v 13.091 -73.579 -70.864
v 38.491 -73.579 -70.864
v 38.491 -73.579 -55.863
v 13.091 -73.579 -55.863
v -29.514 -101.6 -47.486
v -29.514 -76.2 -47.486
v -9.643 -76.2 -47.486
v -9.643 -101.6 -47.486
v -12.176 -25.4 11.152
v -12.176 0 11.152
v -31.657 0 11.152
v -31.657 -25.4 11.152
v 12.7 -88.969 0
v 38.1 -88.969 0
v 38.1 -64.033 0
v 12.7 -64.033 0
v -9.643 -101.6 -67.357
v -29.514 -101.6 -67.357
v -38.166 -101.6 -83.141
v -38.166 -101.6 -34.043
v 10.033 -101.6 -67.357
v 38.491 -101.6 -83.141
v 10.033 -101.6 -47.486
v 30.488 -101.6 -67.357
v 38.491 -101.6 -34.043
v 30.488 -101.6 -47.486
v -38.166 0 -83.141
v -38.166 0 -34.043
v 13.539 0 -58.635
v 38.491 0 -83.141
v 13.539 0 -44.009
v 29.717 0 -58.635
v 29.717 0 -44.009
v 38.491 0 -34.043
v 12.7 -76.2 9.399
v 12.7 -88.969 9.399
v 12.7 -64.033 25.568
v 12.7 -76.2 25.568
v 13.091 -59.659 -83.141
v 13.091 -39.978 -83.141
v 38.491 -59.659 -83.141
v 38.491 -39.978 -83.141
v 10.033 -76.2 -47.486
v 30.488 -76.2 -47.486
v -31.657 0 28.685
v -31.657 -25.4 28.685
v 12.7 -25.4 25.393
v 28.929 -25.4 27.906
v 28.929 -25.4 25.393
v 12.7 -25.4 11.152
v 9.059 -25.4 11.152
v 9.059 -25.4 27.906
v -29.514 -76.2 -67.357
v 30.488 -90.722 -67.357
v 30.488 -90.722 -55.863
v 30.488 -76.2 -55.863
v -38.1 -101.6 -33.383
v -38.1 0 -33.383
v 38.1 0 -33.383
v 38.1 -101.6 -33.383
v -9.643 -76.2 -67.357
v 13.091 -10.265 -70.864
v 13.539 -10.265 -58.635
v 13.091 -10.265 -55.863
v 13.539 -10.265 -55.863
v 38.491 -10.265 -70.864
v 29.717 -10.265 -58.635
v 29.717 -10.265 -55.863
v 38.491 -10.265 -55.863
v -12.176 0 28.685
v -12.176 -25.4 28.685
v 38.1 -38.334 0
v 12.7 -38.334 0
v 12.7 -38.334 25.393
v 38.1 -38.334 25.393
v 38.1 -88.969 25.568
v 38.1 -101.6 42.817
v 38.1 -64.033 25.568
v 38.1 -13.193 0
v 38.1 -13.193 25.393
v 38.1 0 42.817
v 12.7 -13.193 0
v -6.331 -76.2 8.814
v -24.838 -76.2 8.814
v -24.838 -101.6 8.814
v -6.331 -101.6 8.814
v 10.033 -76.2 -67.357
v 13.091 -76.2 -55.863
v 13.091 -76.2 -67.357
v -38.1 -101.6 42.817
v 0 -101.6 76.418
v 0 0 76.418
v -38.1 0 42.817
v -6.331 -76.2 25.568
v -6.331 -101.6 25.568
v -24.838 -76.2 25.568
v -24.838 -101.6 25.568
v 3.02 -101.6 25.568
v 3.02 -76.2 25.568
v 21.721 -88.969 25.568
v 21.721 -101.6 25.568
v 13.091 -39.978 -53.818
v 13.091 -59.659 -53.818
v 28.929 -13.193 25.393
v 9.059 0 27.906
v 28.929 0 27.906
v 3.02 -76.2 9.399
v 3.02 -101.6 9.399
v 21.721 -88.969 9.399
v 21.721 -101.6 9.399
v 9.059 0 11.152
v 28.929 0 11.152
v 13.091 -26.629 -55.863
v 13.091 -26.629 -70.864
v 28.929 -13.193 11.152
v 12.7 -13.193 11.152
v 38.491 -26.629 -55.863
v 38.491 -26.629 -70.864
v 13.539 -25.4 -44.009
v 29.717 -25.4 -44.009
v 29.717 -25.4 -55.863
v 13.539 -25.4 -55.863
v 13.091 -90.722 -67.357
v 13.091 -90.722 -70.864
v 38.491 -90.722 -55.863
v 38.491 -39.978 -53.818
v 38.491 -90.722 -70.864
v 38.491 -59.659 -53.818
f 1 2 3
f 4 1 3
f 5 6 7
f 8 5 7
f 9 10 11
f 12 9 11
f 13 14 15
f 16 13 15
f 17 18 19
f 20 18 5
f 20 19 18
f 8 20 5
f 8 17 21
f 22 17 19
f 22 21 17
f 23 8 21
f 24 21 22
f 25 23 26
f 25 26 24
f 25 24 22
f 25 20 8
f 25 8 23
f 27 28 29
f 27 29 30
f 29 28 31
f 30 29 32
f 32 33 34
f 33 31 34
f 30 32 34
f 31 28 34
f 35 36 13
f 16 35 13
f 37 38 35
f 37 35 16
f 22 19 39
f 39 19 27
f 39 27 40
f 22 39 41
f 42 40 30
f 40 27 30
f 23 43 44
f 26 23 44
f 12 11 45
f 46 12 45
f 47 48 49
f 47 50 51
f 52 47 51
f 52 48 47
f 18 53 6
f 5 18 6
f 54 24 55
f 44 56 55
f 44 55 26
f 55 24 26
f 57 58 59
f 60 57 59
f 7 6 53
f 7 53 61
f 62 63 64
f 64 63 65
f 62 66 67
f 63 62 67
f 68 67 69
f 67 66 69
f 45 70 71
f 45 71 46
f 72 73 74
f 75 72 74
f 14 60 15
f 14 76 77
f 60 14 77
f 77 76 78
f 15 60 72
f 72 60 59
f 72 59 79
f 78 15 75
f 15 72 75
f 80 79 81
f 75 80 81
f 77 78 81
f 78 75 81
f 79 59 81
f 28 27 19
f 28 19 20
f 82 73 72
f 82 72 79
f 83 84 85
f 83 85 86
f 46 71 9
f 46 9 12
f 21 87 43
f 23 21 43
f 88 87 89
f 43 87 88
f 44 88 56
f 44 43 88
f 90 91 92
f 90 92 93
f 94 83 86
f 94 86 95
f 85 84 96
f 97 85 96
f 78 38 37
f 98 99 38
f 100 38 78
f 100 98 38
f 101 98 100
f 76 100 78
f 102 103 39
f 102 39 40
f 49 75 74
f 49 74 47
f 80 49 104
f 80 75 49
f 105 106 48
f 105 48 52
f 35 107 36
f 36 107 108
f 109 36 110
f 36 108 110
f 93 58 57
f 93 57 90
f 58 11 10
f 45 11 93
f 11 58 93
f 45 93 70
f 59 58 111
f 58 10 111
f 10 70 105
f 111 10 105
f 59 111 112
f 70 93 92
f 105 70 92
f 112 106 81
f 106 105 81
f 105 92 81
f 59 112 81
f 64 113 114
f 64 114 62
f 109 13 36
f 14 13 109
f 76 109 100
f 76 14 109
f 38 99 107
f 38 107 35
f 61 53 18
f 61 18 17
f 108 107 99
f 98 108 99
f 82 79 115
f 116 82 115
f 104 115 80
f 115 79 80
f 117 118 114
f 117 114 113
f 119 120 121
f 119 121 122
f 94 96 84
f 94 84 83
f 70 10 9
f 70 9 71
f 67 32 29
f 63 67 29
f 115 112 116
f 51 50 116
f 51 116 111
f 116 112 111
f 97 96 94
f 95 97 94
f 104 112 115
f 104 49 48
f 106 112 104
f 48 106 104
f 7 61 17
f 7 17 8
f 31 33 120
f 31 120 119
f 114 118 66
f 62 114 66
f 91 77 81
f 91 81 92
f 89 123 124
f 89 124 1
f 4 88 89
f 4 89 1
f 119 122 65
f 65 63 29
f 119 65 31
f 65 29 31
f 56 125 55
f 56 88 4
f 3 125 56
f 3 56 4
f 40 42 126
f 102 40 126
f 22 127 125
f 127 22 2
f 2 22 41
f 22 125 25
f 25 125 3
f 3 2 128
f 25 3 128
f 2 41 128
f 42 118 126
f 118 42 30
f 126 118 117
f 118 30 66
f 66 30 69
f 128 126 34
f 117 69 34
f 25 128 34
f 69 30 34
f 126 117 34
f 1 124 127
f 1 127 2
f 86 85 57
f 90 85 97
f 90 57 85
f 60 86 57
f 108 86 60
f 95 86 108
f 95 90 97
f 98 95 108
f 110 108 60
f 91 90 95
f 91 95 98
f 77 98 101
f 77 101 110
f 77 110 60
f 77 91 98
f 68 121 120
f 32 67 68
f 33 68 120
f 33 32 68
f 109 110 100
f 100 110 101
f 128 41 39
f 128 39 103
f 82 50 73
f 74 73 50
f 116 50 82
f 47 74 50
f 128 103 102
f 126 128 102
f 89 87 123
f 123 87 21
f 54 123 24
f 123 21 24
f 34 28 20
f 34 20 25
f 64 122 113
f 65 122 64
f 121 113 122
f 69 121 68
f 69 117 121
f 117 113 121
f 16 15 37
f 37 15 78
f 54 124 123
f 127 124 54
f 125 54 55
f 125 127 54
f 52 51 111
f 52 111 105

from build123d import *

# Parameters (mm, degrees)
F0_W      = 127
F0_H      = 127
F1_DEPTH  = 127
F2_DEPTH  = 76.2
F4_W      = 76.2
F4_H      = 76.2
F5_DEPTH  = 76.2
F7_W      = 76.2
F7_H      = 76.2
F8_DEPTH  = 101.6
F9_W      = 76.6572
F9_H      = 49.0982
F10_DEPTH = 101.6
F11_W     = 19.6814648807
F11_H     = 29.323477298
F12_DEPTH = 25.4
F13_W     = 18.5070778243
F13_H     = 16.753775999
F13_W_2   = 18.7018865254
F13_H_2   = 16.1693412811
F14_DEPTH = 25.4
F15_W     = 17.1433985233
F15_H     = 15.0004737079
F15_W_2   = 16.3641525432
F16_DEPTH = 25.4
F17_W     = 24.9358564615
F17_H     = 25.5680438131
F17_W_2   = 25.1412466168
F17_H_2   = 25.3926105797
F18_DEPTH = 25.4
F19_W     = 19.8707580566
F19_H     = 19.8707543314
F19_W_2   = 20.4551918432
F20_DEPTH = 25.4
F21_W     = 19.8707580566
F21_H     = 16.753775999
F21_W_2   = 19.4811346009
F21_H_2   = 17.5330210477
F22_DEPTH = 25.4
F23_W     = 16.1785436794
F23_H     = 14.625698328
F24_DEPTH = 25.4


with BuildPart() as f1:
    # F0 (on Front) → F1 (new body)
    with BuildSketch(Plane.XZ):
        with Locations((0.1441091299, 23.519541322)):
            Rectangle(F0_W, F0_H)
    extrude(amount=F1_DEPTH)

    # F2 (add): a face of the model
    f2_faces = [f1.faces().sort_by_distance(p)[0] for p in [
        (0.1441091299, -127, 23.519541322),
    ]]
    extrude(f2_faces, amount=F2_DEPTH)


with BuildPart() as f5:
    # F4 (on Front) → F5 (new body)
    with BuildSketch(Plane.XZ):
        with Locations((1.1012312025, 7.9579465741)):
            Rectangle(F4_W, F4_H)
    extrude(amount=F5_DEPTH)


with BuildPart() as f8:
    # F7 (on Front) → F8 (new body)
    with BuildSketch(Plane.XZ):
        Polygon((0, 76.4184445143), (-38.1, 42.8174028638), (38.1, 42.8174028638), align=None)
        with Locations((0, 4.7174028638)):
            Rectangle(F7_W, F7_H)
    extrude(amount=F8_DEPTH)

    # F13 (on face) → F14 (cut)
    with BuildSketch(Plane.XZ.offset(101.6)):
        with Locations((-15.5849086586, 17.1911558136)):
            Rectangle(F13_W, F13_H)
        with Locations((12.3705203878, 17.4833731726)):
            Rectangle(F13_W_2, F13_H_2)
    extrude(amount=-F14_DEPTH, mode=Mode.SUBTRACT)

    # F17 (on face) → F18 (cut)
    with BuildSketch(Plane.YZ.offset(38.1)):
        with Locations((-76.5007138252, 12.7840219066)):
            Rectangle(F17_W, F17_H)
        with Locations((-25.7634408772, 12.6963052899)):
            Rectangle(F17_W_2, F17_H_2)
    extrude(amount=-F18_DEPTH, mode=Mode.SUBTRACT)

    # F21 (on face) → F22 (cut)
    with BuildSketch(Plane(origin=(0, 0, 0), x_dir=(-1, 0, 0), z_dir=(0, 1, 0))):
        with Locations((-18.9941059798, 19.5288928226)):
            Rectangle(F21_W, F21_H)
        with Locations((21.9162753783, 19.9185153469)):
            Rectangle(F21_W_2, F21_H_2)
    extrude(amount=-F22_DEPTH, mode=Mode.SUBTRACT)


with BuildPart() as f10:
    # F9 (on Front) → F10 (new body)
    with BuildSketch(Plane.XZ):
        with Locations((0.1627736495, -58.5922269043)):
            Rectangle(F9_W, F9_H)
    extrude(amount=F10_DEPTH)

    # F11 (on face) → F12 (cut)
    with BuildSketch(Plane.YZ.offset(38.4913736495)):
        with Locations((-49.818245694, -68.4795882553)):
            Rectangle(F11_W, F11_H)
    extrude(amount=-F12_DEPTH, mode=Mode.SUBTRACT)

    # F15 (on face) → F16 (cut)
    with BuildSketch(Plane.YZ.offset(38.4913736495)):
        with Locations((-82.1502432227, -63.3633378893)):
            Rectangle(F15_W, F15_H)
        with Locations((-18.4469339438, -63.3633378893)):
            Rectangle(F15_W_2, F15_H)
    extrude(amount=-F16_DEPTH, mode=Mode.SUBTRACT)

    # F19 (on face) → F20 (cut)
    with BuildSketch(Plane.XZ.offset(101.6)):
        with Locations((-19.5785406977, -57.4215892702)):
            Rectangle(F19_W, F19_H)
        with Locations((20.2603810467, -57.4215892702)):
            Rectangle(F19_W_2, F19_H)
    extrude(amount=-F20_DEPTH, mode=Mode.SUBTRACT)

    # F23 (on face) → F24 (cut)
    with BuildSketch(Plane(origin=(0, 0, 0), x_dir=(-1, 0, 0), z_dir=(0, 1, 0))):
        with Locations((-21.6279965825, -51.3223111629)):
            Rectangle(F23_W, F23_H)
    extrude(amount=-F24_DEPTH, mode=Mode.SUBTRACT)


solid = Compound([f8.part, f10.part])
